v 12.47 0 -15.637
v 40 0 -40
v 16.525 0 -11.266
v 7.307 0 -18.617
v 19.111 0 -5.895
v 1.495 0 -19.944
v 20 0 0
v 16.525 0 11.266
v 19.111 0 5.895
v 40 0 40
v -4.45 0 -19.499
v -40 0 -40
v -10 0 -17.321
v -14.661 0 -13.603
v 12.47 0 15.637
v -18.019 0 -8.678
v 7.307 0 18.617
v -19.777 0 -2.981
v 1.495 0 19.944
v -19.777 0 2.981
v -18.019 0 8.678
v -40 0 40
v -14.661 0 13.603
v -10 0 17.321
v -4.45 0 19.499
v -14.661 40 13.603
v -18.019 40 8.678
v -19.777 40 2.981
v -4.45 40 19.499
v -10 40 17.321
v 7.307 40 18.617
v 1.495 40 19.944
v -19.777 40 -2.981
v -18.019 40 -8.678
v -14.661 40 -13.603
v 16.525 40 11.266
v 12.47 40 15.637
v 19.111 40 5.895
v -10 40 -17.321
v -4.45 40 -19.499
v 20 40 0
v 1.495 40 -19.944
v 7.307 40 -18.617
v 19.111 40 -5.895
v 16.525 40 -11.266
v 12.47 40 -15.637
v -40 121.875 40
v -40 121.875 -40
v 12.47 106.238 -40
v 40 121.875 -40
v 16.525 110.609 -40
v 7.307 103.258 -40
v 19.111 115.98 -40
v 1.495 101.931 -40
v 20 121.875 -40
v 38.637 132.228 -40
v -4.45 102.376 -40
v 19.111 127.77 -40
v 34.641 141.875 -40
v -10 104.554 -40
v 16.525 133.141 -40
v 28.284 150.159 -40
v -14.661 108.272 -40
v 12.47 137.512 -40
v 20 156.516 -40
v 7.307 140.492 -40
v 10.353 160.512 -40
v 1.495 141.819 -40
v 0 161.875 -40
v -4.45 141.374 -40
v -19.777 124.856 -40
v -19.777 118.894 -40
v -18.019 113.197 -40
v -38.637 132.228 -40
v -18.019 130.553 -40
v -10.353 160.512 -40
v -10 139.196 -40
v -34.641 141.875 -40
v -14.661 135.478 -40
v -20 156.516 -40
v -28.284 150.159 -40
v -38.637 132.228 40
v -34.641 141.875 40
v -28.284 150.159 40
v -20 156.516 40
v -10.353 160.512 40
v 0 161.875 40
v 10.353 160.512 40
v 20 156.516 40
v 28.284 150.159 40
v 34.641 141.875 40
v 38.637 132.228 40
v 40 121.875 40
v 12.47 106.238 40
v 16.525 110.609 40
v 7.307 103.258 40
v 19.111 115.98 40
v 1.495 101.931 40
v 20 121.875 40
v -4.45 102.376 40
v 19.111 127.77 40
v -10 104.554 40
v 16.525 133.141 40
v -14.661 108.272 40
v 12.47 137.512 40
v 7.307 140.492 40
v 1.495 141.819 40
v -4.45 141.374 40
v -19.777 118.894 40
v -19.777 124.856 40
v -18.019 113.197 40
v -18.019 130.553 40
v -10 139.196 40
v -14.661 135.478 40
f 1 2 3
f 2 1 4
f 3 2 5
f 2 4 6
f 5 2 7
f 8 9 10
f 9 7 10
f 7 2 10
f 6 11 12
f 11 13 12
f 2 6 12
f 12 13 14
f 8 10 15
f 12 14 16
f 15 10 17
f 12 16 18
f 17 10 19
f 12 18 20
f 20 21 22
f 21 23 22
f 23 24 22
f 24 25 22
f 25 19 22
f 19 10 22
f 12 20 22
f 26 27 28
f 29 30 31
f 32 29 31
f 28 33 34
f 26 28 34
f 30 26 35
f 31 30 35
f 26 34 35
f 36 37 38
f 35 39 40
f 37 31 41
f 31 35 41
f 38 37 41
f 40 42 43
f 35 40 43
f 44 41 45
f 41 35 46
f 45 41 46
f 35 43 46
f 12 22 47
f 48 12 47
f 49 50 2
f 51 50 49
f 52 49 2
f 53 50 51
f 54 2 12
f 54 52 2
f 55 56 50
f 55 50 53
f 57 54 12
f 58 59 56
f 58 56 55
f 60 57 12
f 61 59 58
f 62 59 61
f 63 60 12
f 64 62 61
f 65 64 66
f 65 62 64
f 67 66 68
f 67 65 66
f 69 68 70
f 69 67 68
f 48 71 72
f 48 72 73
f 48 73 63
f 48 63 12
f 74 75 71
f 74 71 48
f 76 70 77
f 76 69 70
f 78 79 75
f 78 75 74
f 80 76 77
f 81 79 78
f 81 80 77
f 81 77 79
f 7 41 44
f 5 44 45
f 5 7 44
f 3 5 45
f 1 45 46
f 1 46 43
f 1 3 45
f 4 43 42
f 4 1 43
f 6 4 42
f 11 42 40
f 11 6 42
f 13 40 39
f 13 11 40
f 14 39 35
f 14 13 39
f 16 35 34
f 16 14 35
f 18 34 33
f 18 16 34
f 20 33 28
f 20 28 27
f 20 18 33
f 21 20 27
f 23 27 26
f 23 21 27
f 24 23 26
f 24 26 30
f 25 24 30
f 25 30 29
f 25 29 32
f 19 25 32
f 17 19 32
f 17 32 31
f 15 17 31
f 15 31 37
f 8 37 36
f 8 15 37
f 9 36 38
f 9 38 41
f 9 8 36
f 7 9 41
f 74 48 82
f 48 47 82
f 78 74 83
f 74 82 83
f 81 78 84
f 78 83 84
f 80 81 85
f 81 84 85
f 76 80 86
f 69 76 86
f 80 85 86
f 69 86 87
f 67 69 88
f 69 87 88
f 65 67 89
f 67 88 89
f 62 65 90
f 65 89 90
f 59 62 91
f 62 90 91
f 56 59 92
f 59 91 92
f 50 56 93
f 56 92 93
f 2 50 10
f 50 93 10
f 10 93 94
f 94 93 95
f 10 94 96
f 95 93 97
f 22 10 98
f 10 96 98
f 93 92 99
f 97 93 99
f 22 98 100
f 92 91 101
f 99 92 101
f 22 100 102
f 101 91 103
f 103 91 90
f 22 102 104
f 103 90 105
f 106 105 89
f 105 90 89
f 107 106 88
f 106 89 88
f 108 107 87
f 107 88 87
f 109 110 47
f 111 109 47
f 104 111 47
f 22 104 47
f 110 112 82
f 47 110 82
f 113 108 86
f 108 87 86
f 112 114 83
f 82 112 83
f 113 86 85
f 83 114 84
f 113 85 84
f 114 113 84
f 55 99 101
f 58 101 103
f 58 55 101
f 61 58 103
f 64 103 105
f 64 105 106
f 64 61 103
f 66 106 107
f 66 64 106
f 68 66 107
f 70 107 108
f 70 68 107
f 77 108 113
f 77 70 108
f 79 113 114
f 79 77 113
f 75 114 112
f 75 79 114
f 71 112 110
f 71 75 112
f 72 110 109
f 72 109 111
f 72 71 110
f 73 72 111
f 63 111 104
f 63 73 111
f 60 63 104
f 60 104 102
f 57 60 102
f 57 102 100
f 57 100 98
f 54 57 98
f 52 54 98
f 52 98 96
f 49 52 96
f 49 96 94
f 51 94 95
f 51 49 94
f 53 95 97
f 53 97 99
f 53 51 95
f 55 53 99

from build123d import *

# Parameters (mm, degrees)
SKETCH1_LINK1_R     = 20
BOSS_EXTRUDE1_DEPTH = 40
SKETCH2_LINK1_R     = 20
CUT_EXTRUDE1_DEPTH  = 40


with BuildPart() as part:
    # sketch1_link1 → Boss-Extrude1 (new body, symmetric)
    with BuildSketch(Plane.XY):
        with BuildLine():
            Line((-40, 0), (-40, 121.875))
            ThreePointArc((-40, 121.875), (0, 161.875), (40, 121.875))
            Line((40, 121.875), (40, 0))
            Line((40, 0), (0, 0))
            Line((0, 0), (-40, 0))
        make_face()
        with Locations((0, 121.875)):
            Circle(SKETCH1_LINK1_R, mode=Mode.SUBTRACT)
    extrude(amount=BOSS_EXTRUDE1_DEPTH, both=True)

    # sketch2_link1 → Cut-Extrude1 (cut)
    with BuildSketch(Plane(origin=(0, 0, 0), x_dir=(1, 0, 0), z_dir=(0, 1, 0))):
        Circle(SKETCH2_LINK1_R)
    extrude(amount=CUT_EXTRUDE1_DEPTH, mode=Mode.SUBTRACT)


solid = part.part
